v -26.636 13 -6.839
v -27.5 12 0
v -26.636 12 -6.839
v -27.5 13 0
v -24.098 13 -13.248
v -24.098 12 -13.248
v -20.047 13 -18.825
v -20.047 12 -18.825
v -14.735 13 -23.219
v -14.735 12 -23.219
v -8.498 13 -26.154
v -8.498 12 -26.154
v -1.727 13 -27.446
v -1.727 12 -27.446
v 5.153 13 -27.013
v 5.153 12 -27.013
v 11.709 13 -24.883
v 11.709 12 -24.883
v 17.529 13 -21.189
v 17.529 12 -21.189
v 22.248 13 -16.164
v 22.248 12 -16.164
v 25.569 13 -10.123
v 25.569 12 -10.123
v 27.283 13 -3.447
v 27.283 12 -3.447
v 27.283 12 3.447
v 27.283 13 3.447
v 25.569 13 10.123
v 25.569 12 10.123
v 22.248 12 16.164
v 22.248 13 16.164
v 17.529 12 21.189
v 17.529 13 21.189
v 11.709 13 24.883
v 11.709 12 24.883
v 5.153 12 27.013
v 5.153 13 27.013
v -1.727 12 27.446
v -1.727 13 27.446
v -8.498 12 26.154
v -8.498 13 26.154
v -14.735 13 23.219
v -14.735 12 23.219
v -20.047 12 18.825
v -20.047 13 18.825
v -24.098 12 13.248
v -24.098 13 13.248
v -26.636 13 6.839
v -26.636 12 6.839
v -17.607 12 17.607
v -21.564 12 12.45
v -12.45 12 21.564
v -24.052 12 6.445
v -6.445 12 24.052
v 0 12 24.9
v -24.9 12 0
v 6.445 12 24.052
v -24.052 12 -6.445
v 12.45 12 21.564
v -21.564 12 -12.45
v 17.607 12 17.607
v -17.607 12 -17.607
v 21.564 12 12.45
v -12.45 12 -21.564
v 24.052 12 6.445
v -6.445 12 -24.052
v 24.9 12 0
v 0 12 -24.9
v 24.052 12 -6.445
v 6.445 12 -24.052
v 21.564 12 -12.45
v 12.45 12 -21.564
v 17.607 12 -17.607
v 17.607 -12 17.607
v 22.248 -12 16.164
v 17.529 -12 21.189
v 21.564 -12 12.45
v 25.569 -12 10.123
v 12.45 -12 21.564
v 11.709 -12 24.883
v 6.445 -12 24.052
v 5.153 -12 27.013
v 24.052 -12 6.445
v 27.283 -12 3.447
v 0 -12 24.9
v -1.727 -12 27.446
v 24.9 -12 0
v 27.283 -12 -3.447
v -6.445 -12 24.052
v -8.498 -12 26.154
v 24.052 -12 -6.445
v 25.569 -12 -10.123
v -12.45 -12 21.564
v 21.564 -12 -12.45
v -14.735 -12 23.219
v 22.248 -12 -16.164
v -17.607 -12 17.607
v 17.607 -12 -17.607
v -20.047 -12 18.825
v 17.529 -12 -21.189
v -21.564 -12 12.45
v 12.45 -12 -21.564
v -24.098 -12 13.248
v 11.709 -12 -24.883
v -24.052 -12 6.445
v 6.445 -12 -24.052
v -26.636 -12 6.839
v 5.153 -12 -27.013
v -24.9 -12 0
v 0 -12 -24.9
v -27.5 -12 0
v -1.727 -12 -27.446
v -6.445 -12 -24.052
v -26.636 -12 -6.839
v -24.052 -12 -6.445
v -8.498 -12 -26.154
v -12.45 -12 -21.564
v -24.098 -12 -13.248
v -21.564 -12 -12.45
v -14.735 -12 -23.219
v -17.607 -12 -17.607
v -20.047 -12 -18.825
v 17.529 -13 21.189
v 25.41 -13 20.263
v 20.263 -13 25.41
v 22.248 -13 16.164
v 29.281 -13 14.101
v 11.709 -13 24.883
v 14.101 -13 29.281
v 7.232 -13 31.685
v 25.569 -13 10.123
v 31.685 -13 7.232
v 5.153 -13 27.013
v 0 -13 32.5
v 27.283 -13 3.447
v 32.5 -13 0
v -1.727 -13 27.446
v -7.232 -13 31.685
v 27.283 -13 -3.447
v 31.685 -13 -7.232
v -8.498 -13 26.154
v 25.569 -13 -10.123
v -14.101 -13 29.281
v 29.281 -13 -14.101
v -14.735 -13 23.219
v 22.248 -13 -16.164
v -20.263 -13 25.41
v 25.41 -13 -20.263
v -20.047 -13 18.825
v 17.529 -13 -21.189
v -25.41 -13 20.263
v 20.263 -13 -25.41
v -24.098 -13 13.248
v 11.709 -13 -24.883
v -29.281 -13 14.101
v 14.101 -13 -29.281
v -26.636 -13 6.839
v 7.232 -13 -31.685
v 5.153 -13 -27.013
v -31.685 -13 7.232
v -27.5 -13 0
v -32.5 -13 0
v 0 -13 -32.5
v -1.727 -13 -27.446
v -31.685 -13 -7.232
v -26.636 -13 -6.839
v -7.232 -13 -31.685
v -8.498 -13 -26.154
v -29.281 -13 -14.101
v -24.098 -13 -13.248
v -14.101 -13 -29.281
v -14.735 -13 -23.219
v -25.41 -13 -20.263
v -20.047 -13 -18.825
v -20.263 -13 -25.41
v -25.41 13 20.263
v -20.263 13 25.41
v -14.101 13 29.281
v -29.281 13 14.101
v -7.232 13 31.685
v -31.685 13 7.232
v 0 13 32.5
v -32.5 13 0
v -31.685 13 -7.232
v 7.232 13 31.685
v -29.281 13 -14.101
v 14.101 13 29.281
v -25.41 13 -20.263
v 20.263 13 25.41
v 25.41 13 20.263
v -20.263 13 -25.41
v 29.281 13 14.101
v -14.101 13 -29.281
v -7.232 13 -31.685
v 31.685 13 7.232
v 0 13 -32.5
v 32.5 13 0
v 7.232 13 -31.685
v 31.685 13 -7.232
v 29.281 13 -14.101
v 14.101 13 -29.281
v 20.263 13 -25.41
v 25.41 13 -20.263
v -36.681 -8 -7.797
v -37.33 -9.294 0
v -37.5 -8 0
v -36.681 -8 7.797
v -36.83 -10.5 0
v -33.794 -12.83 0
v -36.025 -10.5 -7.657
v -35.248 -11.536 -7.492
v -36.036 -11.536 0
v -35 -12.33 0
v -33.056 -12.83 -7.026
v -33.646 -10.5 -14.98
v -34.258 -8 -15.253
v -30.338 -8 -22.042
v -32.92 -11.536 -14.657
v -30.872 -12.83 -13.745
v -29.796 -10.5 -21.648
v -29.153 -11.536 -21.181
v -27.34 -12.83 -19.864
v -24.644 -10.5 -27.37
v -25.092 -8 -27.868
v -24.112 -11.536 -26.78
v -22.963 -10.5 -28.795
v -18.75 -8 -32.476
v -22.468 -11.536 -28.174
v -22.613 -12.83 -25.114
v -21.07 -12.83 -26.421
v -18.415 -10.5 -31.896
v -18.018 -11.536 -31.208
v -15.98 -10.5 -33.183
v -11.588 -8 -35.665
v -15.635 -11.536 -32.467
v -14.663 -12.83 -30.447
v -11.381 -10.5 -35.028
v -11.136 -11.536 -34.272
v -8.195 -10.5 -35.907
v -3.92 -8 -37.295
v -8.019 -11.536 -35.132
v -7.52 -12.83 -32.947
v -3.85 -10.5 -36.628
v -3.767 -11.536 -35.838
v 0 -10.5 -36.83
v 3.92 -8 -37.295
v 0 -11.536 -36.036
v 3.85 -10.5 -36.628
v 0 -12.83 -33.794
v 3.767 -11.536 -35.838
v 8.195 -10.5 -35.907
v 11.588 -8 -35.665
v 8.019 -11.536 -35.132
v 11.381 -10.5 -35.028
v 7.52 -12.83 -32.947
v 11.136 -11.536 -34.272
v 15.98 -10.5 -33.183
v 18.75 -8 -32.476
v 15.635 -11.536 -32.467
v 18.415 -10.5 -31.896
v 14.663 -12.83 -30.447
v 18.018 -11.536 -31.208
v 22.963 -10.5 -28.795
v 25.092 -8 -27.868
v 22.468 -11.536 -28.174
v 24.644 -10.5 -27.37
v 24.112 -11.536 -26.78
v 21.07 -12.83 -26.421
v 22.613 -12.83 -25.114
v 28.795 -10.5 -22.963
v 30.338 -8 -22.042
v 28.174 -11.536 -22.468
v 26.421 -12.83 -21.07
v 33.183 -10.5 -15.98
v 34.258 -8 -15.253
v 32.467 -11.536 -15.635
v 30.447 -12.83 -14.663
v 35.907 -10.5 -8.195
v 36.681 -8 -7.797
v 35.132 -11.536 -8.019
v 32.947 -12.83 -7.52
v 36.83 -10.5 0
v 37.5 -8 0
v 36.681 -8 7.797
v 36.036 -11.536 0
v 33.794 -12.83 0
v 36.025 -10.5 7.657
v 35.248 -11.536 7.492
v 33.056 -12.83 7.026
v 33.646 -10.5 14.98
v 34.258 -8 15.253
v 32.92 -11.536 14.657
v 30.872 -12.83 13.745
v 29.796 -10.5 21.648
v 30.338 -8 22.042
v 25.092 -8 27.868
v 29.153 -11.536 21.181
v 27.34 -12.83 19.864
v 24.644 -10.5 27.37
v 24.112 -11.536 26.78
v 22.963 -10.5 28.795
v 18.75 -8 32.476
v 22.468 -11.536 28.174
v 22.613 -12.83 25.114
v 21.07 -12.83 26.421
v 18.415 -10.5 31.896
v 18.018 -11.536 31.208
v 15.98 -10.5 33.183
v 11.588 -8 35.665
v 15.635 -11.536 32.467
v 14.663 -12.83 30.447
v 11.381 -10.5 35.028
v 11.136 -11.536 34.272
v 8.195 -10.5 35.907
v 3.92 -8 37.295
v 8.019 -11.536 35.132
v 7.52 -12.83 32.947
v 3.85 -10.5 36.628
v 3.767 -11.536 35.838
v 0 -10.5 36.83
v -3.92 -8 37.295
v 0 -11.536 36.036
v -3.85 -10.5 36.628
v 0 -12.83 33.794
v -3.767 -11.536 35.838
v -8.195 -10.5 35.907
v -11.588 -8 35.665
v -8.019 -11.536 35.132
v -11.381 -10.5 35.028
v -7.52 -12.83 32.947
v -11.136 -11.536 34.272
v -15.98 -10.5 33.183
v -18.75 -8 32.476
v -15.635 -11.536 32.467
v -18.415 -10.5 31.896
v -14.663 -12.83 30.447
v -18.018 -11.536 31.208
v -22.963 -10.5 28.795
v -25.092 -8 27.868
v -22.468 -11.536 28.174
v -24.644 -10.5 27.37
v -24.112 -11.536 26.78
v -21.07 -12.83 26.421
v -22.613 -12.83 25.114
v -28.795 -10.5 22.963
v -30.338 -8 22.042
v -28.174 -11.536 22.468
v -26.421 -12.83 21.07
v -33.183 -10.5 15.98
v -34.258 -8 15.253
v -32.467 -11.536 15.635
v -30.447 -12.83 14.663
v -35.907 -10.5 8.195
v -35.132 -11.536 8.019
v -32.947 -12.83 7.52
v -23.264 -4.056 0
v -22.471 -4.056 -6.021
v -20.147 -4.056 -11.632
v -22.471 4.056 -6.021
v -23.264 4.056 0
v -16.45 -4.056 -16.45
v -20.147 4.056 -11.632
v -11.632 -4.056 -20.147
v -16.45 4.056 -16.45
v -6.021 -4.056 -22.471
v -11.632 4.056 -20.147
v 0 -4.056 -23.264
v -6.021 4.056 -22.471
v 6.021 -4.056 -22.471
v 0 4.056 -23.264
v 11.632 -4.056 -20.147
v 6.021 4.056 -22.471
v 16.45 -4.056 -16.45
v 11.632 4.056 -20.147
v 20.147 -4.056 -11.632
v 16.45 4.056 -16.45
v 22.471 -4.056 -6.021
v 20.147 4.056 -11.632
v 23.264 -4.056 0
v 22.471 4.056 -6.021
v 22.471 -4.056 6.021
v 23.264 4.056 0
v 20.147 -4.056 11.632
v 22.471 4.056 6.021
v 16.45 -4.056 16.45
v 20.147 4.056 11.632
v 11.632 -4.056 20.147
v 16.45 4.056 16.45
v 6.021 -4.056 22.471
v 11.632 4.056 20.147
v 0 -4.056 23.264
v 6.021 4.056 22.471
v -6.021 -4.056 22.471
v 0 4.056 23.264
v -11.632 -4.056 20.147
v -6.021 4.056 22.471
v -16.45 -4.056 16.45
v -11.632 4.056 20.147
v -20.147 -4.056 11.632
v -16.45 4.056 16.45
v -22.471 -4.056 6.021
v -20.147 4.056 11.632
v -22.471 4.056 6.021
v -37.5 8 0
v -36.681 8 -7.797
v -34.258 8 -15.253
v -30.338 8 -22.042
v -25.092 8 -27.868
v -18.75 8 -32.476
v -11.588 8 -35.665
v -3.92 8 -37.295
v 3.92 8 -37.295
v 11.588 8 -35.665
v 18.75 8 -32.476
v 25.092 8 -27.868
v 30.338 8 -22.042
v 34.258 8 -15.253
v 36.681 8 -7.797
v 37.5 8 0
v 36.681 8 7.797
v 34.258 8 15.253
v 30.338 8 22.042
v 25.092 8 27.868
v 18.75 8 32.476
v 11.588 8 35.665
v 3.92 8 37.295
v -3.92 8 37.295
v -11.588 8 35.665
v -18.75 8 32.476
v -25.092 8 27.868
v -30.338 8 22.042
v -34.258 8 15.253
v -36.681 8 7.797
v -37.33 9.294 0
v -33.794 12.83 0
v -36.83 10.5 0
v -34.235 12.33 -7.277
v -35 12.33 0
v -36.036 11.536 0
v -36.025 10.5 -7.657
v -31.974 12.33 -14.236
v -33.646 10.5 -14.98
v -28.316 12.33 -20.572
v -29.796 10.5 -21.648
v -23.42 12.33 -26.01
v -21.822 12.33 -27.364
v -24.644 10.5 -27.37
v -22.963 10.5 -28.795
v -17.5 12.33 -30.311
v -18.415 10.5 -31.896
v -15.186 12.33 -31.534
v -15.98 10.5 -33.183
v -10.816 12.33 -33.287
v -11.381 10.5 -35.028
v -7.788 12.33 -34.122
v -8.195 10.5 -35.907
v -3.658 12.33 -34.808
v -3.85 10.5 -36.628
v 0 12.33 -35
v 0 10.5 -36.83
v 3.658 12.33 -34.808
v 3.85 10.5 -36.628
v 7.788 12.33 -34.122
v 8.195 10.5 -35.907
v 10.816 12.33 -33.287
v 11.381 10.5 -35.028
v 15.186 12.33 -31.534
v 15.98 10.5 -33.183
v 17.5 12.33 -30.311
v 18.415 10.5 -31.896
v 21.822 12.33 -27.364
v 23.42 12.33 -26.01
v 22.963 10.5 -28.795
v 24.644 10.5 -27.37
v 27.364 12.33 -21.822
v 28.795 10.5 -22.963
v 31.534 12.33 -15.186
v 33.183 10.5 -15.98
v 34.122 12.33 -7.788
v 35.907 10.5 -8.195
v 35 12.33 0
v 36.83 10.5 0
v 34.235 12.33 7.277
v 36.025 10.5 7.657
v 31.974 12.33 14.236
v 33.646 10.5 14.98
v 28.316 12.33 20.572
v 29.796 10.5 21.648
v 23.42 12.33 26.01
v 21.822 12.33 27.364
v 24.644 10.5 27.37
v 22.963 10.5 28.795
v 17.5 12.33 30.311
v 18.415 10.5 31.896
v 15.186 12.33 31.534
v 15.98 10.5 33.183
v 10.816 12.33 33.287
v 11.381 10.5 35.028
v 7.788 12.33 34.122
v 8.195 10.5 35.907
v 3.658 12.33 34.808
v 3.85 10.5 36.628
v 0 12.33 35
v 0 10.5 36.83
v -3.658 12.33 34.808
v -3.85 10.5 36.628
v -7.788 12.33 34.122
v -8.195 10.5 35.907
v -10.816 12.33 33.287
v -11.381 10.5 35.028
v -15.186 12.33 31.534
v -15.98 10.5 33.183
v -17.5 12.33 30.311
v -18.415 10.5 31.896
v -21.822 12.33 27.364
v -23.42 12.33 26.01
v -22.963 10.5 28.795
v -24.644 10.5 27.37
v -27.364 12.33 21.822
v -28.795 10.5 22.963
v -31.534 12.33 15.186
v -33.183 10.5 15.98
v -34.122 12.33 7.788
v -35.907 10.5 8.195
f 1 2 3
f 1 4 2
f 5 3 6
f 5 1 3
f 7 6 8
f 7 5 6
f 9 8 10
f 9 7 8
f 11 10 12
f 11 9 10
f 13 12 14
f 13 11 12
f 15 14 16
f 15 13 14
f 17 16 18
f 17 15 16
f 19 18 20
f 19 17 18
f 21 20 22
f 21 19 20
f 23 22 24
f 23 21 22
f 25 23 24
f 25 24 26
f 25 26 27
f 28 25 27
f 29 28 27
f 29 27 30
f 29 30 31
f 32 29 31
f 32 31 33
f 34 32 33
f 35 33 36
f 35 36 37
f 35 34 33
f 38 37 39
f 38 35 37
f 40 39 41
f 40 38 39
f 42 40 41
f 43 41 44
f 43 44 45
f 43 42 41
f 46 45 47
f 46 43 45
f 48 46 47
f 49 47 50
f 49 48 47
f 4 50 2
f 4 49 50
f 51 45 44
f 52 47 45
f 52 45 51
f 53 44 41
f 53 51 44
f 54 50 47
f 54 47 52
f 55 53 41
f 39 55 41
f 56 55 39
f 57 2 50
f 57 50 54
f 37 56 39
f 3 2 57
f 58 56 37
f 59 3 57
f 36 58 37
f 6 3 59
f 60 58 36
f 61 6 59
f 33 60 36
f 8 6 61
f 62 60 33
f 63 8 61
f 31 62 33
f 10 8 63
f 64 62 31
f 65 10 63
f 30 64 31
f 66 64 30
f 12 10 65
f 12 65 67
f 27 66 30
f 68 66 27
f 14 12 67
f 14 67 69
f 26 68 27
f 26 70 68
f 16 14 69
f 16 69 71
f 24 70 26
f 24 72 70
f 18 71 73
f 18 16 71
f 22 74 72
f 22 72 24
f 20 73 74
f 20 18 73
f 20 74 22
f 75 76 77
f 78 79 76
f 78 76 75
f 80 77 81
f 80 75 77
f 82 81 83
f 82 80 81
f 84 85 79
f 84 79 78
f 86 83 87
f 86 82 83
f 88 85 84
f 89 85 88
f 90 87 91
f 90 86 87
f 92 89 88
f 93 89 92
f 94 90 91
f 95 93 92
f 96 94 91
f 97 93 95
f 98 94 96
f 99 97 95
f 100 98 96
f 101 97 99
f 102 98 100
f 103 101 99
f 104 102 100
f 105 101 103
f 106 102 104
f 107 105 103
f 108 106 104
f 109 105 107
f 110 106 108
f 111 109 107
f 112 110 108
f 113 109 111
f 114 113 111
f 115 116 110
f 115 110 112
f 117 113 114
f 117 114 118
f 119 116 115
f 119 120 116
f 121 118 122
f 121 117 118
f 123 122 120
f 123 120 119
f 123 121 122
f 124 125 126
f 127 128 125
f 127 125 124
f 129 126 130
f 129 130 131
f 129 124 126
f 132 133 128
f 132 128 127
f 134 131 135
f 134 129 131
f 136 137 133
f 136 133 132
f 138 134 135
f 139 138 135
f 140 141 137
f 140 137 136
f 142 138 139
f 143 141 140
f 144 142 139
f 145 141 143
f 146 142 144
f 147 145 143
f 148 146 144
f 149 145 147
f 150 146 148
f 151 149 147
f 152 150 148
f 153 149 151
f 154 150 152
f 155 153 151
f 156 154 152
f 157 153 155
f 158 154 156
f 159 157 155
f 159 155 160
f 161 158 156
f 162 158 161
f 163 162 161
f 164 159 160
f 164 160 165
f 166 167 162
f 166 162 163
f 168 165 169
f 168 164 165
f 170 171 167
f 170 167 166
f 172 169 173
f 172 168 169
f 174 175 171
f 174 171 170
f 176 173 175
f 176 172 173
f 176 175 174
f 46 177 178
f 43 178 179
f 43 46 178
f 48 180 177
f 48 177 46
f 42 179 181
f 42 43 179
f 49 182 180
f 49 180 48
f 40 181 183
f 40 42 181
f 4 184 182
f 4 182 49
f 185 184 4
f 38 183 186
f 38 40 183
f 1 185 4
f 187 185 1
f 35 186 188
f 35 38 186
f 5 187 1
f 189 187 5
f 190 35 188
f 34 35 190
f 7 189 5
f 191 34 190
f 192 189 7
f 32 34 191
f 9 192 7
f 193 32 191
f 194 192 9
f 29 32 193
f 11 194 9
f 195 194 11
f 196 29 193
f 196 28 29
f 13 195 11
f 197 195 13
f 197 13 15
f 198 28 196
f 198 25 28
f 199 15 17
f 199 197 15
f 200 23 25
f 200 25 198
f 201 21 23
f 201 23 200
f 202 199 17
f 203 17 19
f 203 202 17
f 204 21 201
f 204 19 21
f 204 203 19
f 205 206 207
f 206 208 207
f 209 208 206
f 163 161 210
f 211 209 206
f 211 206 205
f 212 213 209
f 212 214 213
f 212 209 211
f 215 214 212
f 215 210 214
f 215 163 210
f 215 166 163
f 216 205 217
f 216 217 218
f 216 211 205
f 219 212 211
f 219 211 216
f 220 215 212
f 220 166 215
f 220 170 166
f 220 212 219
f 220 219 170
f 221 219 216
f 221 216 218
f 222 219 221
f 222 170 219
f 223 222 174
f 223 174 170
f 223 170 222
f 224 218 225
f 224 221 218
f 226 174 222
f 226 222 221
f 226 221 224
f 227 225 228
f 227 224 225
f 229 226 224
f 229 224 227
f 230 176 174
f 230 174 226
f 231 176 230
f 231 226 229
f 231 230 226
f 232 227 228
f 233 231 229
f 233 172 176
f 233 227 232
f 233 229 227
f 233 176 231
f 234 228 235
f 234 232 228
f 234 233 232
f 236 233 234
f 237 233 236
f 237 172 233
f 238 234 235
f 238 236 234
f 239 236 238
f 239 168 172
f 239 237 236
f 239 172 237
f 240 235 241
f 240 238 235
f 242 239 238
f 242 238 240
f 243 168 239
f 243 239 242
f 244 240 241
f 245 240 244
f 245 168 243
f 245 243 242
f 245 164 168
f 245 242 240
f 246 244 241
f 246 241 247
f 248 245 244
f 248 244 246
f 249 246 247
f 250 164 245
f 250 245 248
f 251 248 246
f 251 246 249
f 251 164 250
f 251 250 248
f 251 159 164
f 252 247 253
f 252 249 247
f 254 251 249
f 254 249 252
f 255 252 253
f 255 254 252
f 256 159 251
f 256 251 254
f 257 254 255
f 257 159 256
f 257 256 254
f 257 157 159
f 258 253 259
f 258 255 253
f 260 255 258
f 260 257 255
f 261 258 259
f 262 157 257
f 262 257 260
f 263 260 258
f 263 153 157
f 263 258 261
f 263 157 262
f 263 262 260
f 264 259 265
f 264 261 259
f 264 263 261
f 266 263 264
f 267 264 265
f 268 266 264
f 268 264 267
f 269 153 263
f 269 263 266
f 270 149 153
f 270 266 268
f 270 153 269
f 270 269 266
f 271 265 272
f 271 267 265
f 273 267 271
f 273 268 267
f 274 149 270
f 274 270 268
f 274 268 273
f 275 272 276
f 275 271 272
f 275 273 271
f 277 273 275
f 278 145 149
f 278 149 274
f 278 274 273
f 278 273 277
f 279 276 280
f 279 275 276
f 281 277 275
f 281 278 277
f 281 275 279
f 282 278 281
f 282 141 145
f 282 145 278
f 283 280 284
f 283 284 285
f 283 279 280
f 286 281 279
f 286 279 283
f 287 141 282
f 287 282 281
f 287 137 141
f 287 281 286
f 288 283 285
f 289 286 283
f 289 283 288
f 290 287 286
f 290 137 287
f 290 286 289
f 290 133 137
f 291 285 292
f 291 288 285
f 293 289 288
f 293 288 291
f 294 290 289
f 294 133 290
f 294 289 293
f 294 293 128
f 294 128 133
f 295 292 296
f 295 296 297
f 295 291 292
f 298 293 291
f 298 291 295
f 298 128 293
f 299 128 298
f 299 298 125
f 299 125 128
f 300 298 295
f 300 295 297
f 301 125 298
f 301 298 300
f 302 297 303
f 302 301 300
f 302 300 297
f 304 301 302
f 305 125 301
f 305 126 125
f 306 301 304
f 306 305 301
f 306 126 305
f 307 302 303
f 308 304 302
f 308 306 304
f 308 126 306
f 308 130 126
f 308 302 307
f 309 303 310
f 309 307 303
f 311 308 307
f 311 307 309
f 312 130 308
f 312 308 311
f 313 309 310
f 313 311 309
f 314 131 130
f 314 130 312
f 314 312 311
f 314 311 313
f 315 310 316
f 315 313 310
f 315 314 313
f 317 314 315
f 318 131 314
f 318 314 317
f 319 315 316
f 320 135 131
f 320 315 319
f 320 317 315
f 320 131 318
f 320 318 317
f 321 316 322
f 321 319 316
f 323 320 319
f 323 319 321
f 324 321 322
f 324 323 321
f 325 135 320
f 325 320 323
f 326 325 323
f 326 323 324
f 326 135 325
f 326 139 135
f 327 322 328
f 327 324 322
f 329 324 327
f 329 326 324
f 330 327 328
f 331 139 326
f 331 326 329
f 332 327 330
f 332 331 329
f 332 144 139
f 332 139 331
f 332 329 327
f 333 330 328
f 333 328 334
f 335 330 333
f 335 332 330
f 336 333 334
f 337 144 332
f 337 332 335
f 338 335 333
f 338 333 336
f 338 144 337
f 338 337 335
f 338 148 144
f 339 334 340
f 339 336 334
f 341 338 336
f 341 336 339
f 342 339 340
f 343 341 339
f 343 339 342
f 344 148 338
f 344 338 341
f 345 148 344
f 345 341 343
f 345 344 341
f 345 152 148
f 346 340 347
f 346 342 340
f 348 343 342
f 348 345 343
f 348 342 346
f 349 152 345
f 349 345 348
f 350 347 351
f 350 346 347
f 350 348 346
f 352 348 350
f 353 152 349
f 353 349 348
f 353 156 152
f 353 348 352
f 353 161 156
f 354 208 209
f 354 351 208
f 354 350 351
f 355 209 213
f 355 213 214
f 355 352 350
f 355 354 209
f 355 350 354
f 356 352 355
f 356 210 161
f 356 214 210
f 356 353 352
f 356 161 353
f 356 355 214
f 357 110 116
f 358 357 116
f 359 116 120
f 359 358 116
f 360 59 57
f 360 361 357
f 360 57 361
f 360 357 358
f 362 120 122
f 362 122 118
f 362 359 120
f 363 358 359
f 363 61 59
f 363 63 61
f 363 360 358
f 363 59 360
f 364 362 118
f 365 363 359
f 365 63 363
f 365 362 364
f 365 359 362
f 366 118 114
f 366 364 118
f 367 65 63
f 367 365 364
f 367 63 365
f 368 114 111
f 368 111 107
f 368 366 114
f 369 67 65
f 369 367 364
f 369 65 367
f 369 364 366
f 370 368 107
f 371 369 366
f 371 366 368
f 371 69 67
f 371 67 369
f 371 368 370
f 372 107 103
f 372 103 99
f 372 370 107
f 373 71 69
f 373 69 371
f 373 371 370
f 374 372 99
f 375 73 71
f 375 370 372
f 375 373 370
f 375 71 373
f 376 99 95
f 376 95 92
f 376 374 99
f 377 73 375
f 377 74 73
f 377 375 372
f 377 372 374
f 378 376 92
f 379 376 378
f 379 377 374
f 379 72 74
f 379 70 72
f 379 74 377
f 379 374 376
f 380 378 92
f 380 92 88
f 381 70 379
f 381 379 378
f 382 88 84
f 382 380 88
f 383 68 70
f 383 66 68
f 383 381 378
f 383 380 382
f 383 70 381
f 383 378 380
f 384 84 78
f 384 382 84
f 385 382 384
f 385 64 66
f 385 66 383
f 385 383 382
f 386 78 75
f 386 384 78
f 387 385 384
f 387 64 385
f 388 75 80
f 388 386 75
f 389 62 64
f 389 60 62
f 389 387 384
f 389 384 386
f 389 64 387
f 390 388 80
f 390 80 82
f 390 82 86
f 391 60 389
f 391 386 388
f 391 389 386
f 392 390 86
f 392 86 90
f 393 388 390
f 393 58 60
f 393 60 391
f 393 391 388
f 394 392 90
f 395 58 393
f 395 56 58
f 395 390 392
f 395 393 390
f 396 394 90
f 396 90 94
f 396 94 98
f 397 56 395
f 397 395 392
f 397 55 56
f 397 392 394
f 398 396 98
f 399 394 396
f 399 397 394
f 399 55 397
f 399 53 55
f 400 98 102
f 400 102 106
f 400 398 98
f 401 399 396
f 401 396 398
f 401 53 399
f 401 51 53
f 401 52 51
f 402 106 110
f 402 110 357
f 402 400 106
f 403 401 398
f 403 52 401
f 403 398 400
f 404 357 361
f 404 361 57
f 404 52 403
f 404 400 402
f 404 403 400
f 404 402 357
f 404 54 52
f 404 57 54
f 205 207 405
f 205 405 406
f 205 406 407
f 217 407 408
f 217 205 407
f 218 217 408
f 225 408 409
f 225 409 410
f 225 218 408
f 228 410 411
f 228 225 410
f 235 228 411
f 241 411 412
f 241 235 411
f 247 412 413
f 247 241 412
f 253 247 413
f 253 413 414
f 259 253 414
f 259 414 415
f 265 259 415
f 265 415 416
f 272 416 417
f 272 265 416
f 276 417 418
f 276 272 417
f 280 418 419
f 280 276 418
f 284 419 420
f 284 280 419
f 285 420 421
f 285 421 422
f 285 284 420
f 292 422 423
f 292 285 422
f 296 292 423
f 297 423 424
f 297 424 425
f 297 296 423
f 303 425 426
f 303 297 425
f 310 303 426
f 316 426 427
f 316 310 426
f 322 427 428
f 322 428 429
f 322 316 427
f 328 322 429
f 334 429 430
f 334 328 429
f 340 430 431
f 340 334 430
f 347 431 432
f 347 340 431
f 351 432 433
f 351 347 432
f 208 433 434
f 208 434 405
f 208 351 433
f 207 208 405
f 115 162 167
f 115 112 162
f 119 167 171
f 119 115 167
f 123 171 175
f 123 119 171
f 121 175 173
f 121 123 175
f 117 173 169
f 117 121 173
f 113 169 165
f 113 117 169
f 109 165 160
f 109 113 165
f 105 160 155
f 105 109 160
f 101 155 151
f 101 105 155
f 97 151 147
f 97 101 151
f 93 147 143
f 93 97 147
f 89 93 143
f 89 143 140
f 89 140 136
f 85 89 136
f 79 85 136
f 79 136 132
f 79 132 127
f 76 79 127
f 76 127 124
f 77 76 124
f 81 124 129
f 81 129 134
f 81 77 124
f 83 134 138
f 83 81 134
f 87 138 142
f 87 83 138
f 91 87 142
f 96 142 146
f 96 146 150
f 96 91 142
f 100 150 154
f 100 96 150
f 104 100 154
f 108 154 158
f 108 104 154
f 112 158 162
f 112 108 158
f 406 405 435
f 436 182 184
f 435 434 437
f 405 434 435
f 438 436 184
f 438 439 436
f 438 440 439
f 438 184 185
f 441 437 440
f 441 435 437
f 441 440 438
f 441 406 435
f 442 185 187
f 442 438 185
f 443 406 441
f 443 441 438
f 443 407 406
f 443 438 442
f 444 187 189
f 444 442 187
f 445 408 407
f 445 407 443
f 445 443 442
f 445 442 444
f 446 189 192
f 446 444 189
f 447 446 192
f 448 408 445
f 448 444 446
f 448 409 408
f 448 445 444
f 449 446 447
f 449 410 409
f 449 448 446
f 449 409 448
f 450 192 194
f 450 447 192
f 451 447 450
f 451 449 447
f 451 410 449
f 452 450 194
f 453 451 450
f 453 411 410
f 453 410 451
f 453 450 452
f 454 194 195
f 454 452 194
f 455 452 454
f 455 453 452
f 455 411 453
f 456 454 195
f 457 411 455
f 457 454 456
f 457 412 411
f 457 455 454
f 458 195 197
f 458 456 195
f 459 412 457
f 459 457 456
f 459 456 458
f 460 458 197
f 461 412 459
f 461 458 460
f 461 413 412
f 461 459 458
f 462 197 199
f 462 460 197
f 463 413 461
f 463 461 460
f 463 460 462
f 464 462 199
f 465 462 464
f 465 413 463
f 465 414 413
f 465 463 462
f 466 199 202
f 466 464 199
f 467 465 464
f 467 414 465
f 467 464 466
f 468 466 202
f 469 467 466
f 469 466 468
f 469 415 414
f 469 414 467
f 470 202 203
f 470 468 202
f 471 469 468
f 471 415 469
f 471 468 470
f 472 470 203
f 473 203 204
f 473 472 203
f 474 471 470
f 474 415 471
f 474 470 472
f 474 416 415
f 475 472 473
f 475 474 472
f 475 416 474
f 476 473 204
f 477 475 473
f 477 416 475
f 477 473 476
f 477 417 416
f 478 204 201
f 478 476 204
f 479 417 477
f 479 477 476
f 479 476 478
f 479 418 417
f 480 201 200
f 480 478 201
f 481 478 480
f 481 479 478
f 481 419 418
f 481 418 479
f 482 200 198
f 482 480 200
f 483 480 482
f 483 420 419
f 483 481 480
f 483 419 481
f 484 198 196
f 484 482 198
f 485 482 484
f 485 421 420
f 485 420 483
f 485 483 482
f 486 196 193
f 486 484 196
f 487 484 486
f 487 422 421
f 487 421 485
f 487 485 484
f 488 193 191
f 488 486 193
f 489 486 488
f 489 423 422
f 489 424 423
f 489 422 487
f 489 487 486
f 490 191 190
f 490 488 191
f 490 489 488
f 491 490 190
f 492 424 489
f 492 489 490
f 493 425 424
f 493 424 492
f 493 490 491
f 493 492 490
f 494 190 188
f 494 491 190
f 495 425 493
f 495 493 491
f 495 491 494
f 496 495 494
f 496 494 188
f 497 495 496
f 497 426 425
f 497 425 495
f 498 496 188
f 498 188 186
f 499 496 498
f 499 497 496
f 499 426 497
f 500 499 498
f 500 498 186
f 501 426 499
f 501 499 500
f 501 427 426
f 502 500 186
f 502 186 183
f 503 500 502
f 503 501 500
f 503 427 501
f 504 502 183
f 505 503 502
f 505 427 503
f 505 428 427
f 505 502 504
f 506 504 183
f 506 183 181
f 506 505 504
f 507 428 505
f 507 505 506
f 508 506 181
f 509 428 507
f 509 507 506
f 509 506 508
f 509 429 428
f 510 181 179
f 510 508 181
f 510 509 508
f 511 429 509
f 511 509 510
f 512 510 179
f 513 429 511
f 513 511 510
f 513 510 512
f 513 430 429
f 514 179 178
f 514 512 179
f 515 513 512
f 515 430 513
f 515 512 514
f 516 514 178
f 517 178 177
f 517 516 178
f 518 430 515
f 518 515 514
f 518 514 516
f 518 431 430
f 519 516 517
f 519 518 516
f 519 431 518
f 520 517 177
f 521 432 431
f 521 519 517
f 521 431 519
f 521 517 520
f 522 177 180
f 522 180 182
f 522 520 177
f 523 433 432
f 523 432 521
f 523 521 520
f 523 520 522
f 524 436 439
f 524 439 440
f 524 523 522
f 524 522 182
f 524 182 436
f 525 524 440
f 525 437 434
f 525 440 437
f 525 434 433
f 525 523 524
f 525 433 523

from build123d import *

# Parameters (mm, degrees)
FILLET1_R = 5


with BuildPart() as part:
    # Sketch1 → Revolve3 (revolve)
    with BuildSketch(Plane.XY):
        with BuildLine():
            Line((-27.5, -13), (-27.5, -12))
            Line((-27.5, -12), (-24.9, -12))
            ThreePointArc((-24.9, -12), (-23.057568057, 0), (-24.9, 12))
            Line((-24.9, 12), (-27.5, 12))
            Line((-27.5, 12), (-27.5, 13))
            Line((-27.5, 13), (-37.5, 13))
            Line((-37.5, 13), (-37.5, -13))
            Line((-37.5, -13), (-27.5, -13))
        make_face()
    revolve(axis=Axis((0, 39.143904287, 0), (0, -1, 0)))

    # Fillet1
    fillet1_edges = [part.edges().sort_by_distance(p)[0] for p in [
        (37.5, -13, 0),
        (37.5, 13, 0),
    ]]
    fillet(fillet1_edges, radius=FILLET1_R)


solid = part.part
